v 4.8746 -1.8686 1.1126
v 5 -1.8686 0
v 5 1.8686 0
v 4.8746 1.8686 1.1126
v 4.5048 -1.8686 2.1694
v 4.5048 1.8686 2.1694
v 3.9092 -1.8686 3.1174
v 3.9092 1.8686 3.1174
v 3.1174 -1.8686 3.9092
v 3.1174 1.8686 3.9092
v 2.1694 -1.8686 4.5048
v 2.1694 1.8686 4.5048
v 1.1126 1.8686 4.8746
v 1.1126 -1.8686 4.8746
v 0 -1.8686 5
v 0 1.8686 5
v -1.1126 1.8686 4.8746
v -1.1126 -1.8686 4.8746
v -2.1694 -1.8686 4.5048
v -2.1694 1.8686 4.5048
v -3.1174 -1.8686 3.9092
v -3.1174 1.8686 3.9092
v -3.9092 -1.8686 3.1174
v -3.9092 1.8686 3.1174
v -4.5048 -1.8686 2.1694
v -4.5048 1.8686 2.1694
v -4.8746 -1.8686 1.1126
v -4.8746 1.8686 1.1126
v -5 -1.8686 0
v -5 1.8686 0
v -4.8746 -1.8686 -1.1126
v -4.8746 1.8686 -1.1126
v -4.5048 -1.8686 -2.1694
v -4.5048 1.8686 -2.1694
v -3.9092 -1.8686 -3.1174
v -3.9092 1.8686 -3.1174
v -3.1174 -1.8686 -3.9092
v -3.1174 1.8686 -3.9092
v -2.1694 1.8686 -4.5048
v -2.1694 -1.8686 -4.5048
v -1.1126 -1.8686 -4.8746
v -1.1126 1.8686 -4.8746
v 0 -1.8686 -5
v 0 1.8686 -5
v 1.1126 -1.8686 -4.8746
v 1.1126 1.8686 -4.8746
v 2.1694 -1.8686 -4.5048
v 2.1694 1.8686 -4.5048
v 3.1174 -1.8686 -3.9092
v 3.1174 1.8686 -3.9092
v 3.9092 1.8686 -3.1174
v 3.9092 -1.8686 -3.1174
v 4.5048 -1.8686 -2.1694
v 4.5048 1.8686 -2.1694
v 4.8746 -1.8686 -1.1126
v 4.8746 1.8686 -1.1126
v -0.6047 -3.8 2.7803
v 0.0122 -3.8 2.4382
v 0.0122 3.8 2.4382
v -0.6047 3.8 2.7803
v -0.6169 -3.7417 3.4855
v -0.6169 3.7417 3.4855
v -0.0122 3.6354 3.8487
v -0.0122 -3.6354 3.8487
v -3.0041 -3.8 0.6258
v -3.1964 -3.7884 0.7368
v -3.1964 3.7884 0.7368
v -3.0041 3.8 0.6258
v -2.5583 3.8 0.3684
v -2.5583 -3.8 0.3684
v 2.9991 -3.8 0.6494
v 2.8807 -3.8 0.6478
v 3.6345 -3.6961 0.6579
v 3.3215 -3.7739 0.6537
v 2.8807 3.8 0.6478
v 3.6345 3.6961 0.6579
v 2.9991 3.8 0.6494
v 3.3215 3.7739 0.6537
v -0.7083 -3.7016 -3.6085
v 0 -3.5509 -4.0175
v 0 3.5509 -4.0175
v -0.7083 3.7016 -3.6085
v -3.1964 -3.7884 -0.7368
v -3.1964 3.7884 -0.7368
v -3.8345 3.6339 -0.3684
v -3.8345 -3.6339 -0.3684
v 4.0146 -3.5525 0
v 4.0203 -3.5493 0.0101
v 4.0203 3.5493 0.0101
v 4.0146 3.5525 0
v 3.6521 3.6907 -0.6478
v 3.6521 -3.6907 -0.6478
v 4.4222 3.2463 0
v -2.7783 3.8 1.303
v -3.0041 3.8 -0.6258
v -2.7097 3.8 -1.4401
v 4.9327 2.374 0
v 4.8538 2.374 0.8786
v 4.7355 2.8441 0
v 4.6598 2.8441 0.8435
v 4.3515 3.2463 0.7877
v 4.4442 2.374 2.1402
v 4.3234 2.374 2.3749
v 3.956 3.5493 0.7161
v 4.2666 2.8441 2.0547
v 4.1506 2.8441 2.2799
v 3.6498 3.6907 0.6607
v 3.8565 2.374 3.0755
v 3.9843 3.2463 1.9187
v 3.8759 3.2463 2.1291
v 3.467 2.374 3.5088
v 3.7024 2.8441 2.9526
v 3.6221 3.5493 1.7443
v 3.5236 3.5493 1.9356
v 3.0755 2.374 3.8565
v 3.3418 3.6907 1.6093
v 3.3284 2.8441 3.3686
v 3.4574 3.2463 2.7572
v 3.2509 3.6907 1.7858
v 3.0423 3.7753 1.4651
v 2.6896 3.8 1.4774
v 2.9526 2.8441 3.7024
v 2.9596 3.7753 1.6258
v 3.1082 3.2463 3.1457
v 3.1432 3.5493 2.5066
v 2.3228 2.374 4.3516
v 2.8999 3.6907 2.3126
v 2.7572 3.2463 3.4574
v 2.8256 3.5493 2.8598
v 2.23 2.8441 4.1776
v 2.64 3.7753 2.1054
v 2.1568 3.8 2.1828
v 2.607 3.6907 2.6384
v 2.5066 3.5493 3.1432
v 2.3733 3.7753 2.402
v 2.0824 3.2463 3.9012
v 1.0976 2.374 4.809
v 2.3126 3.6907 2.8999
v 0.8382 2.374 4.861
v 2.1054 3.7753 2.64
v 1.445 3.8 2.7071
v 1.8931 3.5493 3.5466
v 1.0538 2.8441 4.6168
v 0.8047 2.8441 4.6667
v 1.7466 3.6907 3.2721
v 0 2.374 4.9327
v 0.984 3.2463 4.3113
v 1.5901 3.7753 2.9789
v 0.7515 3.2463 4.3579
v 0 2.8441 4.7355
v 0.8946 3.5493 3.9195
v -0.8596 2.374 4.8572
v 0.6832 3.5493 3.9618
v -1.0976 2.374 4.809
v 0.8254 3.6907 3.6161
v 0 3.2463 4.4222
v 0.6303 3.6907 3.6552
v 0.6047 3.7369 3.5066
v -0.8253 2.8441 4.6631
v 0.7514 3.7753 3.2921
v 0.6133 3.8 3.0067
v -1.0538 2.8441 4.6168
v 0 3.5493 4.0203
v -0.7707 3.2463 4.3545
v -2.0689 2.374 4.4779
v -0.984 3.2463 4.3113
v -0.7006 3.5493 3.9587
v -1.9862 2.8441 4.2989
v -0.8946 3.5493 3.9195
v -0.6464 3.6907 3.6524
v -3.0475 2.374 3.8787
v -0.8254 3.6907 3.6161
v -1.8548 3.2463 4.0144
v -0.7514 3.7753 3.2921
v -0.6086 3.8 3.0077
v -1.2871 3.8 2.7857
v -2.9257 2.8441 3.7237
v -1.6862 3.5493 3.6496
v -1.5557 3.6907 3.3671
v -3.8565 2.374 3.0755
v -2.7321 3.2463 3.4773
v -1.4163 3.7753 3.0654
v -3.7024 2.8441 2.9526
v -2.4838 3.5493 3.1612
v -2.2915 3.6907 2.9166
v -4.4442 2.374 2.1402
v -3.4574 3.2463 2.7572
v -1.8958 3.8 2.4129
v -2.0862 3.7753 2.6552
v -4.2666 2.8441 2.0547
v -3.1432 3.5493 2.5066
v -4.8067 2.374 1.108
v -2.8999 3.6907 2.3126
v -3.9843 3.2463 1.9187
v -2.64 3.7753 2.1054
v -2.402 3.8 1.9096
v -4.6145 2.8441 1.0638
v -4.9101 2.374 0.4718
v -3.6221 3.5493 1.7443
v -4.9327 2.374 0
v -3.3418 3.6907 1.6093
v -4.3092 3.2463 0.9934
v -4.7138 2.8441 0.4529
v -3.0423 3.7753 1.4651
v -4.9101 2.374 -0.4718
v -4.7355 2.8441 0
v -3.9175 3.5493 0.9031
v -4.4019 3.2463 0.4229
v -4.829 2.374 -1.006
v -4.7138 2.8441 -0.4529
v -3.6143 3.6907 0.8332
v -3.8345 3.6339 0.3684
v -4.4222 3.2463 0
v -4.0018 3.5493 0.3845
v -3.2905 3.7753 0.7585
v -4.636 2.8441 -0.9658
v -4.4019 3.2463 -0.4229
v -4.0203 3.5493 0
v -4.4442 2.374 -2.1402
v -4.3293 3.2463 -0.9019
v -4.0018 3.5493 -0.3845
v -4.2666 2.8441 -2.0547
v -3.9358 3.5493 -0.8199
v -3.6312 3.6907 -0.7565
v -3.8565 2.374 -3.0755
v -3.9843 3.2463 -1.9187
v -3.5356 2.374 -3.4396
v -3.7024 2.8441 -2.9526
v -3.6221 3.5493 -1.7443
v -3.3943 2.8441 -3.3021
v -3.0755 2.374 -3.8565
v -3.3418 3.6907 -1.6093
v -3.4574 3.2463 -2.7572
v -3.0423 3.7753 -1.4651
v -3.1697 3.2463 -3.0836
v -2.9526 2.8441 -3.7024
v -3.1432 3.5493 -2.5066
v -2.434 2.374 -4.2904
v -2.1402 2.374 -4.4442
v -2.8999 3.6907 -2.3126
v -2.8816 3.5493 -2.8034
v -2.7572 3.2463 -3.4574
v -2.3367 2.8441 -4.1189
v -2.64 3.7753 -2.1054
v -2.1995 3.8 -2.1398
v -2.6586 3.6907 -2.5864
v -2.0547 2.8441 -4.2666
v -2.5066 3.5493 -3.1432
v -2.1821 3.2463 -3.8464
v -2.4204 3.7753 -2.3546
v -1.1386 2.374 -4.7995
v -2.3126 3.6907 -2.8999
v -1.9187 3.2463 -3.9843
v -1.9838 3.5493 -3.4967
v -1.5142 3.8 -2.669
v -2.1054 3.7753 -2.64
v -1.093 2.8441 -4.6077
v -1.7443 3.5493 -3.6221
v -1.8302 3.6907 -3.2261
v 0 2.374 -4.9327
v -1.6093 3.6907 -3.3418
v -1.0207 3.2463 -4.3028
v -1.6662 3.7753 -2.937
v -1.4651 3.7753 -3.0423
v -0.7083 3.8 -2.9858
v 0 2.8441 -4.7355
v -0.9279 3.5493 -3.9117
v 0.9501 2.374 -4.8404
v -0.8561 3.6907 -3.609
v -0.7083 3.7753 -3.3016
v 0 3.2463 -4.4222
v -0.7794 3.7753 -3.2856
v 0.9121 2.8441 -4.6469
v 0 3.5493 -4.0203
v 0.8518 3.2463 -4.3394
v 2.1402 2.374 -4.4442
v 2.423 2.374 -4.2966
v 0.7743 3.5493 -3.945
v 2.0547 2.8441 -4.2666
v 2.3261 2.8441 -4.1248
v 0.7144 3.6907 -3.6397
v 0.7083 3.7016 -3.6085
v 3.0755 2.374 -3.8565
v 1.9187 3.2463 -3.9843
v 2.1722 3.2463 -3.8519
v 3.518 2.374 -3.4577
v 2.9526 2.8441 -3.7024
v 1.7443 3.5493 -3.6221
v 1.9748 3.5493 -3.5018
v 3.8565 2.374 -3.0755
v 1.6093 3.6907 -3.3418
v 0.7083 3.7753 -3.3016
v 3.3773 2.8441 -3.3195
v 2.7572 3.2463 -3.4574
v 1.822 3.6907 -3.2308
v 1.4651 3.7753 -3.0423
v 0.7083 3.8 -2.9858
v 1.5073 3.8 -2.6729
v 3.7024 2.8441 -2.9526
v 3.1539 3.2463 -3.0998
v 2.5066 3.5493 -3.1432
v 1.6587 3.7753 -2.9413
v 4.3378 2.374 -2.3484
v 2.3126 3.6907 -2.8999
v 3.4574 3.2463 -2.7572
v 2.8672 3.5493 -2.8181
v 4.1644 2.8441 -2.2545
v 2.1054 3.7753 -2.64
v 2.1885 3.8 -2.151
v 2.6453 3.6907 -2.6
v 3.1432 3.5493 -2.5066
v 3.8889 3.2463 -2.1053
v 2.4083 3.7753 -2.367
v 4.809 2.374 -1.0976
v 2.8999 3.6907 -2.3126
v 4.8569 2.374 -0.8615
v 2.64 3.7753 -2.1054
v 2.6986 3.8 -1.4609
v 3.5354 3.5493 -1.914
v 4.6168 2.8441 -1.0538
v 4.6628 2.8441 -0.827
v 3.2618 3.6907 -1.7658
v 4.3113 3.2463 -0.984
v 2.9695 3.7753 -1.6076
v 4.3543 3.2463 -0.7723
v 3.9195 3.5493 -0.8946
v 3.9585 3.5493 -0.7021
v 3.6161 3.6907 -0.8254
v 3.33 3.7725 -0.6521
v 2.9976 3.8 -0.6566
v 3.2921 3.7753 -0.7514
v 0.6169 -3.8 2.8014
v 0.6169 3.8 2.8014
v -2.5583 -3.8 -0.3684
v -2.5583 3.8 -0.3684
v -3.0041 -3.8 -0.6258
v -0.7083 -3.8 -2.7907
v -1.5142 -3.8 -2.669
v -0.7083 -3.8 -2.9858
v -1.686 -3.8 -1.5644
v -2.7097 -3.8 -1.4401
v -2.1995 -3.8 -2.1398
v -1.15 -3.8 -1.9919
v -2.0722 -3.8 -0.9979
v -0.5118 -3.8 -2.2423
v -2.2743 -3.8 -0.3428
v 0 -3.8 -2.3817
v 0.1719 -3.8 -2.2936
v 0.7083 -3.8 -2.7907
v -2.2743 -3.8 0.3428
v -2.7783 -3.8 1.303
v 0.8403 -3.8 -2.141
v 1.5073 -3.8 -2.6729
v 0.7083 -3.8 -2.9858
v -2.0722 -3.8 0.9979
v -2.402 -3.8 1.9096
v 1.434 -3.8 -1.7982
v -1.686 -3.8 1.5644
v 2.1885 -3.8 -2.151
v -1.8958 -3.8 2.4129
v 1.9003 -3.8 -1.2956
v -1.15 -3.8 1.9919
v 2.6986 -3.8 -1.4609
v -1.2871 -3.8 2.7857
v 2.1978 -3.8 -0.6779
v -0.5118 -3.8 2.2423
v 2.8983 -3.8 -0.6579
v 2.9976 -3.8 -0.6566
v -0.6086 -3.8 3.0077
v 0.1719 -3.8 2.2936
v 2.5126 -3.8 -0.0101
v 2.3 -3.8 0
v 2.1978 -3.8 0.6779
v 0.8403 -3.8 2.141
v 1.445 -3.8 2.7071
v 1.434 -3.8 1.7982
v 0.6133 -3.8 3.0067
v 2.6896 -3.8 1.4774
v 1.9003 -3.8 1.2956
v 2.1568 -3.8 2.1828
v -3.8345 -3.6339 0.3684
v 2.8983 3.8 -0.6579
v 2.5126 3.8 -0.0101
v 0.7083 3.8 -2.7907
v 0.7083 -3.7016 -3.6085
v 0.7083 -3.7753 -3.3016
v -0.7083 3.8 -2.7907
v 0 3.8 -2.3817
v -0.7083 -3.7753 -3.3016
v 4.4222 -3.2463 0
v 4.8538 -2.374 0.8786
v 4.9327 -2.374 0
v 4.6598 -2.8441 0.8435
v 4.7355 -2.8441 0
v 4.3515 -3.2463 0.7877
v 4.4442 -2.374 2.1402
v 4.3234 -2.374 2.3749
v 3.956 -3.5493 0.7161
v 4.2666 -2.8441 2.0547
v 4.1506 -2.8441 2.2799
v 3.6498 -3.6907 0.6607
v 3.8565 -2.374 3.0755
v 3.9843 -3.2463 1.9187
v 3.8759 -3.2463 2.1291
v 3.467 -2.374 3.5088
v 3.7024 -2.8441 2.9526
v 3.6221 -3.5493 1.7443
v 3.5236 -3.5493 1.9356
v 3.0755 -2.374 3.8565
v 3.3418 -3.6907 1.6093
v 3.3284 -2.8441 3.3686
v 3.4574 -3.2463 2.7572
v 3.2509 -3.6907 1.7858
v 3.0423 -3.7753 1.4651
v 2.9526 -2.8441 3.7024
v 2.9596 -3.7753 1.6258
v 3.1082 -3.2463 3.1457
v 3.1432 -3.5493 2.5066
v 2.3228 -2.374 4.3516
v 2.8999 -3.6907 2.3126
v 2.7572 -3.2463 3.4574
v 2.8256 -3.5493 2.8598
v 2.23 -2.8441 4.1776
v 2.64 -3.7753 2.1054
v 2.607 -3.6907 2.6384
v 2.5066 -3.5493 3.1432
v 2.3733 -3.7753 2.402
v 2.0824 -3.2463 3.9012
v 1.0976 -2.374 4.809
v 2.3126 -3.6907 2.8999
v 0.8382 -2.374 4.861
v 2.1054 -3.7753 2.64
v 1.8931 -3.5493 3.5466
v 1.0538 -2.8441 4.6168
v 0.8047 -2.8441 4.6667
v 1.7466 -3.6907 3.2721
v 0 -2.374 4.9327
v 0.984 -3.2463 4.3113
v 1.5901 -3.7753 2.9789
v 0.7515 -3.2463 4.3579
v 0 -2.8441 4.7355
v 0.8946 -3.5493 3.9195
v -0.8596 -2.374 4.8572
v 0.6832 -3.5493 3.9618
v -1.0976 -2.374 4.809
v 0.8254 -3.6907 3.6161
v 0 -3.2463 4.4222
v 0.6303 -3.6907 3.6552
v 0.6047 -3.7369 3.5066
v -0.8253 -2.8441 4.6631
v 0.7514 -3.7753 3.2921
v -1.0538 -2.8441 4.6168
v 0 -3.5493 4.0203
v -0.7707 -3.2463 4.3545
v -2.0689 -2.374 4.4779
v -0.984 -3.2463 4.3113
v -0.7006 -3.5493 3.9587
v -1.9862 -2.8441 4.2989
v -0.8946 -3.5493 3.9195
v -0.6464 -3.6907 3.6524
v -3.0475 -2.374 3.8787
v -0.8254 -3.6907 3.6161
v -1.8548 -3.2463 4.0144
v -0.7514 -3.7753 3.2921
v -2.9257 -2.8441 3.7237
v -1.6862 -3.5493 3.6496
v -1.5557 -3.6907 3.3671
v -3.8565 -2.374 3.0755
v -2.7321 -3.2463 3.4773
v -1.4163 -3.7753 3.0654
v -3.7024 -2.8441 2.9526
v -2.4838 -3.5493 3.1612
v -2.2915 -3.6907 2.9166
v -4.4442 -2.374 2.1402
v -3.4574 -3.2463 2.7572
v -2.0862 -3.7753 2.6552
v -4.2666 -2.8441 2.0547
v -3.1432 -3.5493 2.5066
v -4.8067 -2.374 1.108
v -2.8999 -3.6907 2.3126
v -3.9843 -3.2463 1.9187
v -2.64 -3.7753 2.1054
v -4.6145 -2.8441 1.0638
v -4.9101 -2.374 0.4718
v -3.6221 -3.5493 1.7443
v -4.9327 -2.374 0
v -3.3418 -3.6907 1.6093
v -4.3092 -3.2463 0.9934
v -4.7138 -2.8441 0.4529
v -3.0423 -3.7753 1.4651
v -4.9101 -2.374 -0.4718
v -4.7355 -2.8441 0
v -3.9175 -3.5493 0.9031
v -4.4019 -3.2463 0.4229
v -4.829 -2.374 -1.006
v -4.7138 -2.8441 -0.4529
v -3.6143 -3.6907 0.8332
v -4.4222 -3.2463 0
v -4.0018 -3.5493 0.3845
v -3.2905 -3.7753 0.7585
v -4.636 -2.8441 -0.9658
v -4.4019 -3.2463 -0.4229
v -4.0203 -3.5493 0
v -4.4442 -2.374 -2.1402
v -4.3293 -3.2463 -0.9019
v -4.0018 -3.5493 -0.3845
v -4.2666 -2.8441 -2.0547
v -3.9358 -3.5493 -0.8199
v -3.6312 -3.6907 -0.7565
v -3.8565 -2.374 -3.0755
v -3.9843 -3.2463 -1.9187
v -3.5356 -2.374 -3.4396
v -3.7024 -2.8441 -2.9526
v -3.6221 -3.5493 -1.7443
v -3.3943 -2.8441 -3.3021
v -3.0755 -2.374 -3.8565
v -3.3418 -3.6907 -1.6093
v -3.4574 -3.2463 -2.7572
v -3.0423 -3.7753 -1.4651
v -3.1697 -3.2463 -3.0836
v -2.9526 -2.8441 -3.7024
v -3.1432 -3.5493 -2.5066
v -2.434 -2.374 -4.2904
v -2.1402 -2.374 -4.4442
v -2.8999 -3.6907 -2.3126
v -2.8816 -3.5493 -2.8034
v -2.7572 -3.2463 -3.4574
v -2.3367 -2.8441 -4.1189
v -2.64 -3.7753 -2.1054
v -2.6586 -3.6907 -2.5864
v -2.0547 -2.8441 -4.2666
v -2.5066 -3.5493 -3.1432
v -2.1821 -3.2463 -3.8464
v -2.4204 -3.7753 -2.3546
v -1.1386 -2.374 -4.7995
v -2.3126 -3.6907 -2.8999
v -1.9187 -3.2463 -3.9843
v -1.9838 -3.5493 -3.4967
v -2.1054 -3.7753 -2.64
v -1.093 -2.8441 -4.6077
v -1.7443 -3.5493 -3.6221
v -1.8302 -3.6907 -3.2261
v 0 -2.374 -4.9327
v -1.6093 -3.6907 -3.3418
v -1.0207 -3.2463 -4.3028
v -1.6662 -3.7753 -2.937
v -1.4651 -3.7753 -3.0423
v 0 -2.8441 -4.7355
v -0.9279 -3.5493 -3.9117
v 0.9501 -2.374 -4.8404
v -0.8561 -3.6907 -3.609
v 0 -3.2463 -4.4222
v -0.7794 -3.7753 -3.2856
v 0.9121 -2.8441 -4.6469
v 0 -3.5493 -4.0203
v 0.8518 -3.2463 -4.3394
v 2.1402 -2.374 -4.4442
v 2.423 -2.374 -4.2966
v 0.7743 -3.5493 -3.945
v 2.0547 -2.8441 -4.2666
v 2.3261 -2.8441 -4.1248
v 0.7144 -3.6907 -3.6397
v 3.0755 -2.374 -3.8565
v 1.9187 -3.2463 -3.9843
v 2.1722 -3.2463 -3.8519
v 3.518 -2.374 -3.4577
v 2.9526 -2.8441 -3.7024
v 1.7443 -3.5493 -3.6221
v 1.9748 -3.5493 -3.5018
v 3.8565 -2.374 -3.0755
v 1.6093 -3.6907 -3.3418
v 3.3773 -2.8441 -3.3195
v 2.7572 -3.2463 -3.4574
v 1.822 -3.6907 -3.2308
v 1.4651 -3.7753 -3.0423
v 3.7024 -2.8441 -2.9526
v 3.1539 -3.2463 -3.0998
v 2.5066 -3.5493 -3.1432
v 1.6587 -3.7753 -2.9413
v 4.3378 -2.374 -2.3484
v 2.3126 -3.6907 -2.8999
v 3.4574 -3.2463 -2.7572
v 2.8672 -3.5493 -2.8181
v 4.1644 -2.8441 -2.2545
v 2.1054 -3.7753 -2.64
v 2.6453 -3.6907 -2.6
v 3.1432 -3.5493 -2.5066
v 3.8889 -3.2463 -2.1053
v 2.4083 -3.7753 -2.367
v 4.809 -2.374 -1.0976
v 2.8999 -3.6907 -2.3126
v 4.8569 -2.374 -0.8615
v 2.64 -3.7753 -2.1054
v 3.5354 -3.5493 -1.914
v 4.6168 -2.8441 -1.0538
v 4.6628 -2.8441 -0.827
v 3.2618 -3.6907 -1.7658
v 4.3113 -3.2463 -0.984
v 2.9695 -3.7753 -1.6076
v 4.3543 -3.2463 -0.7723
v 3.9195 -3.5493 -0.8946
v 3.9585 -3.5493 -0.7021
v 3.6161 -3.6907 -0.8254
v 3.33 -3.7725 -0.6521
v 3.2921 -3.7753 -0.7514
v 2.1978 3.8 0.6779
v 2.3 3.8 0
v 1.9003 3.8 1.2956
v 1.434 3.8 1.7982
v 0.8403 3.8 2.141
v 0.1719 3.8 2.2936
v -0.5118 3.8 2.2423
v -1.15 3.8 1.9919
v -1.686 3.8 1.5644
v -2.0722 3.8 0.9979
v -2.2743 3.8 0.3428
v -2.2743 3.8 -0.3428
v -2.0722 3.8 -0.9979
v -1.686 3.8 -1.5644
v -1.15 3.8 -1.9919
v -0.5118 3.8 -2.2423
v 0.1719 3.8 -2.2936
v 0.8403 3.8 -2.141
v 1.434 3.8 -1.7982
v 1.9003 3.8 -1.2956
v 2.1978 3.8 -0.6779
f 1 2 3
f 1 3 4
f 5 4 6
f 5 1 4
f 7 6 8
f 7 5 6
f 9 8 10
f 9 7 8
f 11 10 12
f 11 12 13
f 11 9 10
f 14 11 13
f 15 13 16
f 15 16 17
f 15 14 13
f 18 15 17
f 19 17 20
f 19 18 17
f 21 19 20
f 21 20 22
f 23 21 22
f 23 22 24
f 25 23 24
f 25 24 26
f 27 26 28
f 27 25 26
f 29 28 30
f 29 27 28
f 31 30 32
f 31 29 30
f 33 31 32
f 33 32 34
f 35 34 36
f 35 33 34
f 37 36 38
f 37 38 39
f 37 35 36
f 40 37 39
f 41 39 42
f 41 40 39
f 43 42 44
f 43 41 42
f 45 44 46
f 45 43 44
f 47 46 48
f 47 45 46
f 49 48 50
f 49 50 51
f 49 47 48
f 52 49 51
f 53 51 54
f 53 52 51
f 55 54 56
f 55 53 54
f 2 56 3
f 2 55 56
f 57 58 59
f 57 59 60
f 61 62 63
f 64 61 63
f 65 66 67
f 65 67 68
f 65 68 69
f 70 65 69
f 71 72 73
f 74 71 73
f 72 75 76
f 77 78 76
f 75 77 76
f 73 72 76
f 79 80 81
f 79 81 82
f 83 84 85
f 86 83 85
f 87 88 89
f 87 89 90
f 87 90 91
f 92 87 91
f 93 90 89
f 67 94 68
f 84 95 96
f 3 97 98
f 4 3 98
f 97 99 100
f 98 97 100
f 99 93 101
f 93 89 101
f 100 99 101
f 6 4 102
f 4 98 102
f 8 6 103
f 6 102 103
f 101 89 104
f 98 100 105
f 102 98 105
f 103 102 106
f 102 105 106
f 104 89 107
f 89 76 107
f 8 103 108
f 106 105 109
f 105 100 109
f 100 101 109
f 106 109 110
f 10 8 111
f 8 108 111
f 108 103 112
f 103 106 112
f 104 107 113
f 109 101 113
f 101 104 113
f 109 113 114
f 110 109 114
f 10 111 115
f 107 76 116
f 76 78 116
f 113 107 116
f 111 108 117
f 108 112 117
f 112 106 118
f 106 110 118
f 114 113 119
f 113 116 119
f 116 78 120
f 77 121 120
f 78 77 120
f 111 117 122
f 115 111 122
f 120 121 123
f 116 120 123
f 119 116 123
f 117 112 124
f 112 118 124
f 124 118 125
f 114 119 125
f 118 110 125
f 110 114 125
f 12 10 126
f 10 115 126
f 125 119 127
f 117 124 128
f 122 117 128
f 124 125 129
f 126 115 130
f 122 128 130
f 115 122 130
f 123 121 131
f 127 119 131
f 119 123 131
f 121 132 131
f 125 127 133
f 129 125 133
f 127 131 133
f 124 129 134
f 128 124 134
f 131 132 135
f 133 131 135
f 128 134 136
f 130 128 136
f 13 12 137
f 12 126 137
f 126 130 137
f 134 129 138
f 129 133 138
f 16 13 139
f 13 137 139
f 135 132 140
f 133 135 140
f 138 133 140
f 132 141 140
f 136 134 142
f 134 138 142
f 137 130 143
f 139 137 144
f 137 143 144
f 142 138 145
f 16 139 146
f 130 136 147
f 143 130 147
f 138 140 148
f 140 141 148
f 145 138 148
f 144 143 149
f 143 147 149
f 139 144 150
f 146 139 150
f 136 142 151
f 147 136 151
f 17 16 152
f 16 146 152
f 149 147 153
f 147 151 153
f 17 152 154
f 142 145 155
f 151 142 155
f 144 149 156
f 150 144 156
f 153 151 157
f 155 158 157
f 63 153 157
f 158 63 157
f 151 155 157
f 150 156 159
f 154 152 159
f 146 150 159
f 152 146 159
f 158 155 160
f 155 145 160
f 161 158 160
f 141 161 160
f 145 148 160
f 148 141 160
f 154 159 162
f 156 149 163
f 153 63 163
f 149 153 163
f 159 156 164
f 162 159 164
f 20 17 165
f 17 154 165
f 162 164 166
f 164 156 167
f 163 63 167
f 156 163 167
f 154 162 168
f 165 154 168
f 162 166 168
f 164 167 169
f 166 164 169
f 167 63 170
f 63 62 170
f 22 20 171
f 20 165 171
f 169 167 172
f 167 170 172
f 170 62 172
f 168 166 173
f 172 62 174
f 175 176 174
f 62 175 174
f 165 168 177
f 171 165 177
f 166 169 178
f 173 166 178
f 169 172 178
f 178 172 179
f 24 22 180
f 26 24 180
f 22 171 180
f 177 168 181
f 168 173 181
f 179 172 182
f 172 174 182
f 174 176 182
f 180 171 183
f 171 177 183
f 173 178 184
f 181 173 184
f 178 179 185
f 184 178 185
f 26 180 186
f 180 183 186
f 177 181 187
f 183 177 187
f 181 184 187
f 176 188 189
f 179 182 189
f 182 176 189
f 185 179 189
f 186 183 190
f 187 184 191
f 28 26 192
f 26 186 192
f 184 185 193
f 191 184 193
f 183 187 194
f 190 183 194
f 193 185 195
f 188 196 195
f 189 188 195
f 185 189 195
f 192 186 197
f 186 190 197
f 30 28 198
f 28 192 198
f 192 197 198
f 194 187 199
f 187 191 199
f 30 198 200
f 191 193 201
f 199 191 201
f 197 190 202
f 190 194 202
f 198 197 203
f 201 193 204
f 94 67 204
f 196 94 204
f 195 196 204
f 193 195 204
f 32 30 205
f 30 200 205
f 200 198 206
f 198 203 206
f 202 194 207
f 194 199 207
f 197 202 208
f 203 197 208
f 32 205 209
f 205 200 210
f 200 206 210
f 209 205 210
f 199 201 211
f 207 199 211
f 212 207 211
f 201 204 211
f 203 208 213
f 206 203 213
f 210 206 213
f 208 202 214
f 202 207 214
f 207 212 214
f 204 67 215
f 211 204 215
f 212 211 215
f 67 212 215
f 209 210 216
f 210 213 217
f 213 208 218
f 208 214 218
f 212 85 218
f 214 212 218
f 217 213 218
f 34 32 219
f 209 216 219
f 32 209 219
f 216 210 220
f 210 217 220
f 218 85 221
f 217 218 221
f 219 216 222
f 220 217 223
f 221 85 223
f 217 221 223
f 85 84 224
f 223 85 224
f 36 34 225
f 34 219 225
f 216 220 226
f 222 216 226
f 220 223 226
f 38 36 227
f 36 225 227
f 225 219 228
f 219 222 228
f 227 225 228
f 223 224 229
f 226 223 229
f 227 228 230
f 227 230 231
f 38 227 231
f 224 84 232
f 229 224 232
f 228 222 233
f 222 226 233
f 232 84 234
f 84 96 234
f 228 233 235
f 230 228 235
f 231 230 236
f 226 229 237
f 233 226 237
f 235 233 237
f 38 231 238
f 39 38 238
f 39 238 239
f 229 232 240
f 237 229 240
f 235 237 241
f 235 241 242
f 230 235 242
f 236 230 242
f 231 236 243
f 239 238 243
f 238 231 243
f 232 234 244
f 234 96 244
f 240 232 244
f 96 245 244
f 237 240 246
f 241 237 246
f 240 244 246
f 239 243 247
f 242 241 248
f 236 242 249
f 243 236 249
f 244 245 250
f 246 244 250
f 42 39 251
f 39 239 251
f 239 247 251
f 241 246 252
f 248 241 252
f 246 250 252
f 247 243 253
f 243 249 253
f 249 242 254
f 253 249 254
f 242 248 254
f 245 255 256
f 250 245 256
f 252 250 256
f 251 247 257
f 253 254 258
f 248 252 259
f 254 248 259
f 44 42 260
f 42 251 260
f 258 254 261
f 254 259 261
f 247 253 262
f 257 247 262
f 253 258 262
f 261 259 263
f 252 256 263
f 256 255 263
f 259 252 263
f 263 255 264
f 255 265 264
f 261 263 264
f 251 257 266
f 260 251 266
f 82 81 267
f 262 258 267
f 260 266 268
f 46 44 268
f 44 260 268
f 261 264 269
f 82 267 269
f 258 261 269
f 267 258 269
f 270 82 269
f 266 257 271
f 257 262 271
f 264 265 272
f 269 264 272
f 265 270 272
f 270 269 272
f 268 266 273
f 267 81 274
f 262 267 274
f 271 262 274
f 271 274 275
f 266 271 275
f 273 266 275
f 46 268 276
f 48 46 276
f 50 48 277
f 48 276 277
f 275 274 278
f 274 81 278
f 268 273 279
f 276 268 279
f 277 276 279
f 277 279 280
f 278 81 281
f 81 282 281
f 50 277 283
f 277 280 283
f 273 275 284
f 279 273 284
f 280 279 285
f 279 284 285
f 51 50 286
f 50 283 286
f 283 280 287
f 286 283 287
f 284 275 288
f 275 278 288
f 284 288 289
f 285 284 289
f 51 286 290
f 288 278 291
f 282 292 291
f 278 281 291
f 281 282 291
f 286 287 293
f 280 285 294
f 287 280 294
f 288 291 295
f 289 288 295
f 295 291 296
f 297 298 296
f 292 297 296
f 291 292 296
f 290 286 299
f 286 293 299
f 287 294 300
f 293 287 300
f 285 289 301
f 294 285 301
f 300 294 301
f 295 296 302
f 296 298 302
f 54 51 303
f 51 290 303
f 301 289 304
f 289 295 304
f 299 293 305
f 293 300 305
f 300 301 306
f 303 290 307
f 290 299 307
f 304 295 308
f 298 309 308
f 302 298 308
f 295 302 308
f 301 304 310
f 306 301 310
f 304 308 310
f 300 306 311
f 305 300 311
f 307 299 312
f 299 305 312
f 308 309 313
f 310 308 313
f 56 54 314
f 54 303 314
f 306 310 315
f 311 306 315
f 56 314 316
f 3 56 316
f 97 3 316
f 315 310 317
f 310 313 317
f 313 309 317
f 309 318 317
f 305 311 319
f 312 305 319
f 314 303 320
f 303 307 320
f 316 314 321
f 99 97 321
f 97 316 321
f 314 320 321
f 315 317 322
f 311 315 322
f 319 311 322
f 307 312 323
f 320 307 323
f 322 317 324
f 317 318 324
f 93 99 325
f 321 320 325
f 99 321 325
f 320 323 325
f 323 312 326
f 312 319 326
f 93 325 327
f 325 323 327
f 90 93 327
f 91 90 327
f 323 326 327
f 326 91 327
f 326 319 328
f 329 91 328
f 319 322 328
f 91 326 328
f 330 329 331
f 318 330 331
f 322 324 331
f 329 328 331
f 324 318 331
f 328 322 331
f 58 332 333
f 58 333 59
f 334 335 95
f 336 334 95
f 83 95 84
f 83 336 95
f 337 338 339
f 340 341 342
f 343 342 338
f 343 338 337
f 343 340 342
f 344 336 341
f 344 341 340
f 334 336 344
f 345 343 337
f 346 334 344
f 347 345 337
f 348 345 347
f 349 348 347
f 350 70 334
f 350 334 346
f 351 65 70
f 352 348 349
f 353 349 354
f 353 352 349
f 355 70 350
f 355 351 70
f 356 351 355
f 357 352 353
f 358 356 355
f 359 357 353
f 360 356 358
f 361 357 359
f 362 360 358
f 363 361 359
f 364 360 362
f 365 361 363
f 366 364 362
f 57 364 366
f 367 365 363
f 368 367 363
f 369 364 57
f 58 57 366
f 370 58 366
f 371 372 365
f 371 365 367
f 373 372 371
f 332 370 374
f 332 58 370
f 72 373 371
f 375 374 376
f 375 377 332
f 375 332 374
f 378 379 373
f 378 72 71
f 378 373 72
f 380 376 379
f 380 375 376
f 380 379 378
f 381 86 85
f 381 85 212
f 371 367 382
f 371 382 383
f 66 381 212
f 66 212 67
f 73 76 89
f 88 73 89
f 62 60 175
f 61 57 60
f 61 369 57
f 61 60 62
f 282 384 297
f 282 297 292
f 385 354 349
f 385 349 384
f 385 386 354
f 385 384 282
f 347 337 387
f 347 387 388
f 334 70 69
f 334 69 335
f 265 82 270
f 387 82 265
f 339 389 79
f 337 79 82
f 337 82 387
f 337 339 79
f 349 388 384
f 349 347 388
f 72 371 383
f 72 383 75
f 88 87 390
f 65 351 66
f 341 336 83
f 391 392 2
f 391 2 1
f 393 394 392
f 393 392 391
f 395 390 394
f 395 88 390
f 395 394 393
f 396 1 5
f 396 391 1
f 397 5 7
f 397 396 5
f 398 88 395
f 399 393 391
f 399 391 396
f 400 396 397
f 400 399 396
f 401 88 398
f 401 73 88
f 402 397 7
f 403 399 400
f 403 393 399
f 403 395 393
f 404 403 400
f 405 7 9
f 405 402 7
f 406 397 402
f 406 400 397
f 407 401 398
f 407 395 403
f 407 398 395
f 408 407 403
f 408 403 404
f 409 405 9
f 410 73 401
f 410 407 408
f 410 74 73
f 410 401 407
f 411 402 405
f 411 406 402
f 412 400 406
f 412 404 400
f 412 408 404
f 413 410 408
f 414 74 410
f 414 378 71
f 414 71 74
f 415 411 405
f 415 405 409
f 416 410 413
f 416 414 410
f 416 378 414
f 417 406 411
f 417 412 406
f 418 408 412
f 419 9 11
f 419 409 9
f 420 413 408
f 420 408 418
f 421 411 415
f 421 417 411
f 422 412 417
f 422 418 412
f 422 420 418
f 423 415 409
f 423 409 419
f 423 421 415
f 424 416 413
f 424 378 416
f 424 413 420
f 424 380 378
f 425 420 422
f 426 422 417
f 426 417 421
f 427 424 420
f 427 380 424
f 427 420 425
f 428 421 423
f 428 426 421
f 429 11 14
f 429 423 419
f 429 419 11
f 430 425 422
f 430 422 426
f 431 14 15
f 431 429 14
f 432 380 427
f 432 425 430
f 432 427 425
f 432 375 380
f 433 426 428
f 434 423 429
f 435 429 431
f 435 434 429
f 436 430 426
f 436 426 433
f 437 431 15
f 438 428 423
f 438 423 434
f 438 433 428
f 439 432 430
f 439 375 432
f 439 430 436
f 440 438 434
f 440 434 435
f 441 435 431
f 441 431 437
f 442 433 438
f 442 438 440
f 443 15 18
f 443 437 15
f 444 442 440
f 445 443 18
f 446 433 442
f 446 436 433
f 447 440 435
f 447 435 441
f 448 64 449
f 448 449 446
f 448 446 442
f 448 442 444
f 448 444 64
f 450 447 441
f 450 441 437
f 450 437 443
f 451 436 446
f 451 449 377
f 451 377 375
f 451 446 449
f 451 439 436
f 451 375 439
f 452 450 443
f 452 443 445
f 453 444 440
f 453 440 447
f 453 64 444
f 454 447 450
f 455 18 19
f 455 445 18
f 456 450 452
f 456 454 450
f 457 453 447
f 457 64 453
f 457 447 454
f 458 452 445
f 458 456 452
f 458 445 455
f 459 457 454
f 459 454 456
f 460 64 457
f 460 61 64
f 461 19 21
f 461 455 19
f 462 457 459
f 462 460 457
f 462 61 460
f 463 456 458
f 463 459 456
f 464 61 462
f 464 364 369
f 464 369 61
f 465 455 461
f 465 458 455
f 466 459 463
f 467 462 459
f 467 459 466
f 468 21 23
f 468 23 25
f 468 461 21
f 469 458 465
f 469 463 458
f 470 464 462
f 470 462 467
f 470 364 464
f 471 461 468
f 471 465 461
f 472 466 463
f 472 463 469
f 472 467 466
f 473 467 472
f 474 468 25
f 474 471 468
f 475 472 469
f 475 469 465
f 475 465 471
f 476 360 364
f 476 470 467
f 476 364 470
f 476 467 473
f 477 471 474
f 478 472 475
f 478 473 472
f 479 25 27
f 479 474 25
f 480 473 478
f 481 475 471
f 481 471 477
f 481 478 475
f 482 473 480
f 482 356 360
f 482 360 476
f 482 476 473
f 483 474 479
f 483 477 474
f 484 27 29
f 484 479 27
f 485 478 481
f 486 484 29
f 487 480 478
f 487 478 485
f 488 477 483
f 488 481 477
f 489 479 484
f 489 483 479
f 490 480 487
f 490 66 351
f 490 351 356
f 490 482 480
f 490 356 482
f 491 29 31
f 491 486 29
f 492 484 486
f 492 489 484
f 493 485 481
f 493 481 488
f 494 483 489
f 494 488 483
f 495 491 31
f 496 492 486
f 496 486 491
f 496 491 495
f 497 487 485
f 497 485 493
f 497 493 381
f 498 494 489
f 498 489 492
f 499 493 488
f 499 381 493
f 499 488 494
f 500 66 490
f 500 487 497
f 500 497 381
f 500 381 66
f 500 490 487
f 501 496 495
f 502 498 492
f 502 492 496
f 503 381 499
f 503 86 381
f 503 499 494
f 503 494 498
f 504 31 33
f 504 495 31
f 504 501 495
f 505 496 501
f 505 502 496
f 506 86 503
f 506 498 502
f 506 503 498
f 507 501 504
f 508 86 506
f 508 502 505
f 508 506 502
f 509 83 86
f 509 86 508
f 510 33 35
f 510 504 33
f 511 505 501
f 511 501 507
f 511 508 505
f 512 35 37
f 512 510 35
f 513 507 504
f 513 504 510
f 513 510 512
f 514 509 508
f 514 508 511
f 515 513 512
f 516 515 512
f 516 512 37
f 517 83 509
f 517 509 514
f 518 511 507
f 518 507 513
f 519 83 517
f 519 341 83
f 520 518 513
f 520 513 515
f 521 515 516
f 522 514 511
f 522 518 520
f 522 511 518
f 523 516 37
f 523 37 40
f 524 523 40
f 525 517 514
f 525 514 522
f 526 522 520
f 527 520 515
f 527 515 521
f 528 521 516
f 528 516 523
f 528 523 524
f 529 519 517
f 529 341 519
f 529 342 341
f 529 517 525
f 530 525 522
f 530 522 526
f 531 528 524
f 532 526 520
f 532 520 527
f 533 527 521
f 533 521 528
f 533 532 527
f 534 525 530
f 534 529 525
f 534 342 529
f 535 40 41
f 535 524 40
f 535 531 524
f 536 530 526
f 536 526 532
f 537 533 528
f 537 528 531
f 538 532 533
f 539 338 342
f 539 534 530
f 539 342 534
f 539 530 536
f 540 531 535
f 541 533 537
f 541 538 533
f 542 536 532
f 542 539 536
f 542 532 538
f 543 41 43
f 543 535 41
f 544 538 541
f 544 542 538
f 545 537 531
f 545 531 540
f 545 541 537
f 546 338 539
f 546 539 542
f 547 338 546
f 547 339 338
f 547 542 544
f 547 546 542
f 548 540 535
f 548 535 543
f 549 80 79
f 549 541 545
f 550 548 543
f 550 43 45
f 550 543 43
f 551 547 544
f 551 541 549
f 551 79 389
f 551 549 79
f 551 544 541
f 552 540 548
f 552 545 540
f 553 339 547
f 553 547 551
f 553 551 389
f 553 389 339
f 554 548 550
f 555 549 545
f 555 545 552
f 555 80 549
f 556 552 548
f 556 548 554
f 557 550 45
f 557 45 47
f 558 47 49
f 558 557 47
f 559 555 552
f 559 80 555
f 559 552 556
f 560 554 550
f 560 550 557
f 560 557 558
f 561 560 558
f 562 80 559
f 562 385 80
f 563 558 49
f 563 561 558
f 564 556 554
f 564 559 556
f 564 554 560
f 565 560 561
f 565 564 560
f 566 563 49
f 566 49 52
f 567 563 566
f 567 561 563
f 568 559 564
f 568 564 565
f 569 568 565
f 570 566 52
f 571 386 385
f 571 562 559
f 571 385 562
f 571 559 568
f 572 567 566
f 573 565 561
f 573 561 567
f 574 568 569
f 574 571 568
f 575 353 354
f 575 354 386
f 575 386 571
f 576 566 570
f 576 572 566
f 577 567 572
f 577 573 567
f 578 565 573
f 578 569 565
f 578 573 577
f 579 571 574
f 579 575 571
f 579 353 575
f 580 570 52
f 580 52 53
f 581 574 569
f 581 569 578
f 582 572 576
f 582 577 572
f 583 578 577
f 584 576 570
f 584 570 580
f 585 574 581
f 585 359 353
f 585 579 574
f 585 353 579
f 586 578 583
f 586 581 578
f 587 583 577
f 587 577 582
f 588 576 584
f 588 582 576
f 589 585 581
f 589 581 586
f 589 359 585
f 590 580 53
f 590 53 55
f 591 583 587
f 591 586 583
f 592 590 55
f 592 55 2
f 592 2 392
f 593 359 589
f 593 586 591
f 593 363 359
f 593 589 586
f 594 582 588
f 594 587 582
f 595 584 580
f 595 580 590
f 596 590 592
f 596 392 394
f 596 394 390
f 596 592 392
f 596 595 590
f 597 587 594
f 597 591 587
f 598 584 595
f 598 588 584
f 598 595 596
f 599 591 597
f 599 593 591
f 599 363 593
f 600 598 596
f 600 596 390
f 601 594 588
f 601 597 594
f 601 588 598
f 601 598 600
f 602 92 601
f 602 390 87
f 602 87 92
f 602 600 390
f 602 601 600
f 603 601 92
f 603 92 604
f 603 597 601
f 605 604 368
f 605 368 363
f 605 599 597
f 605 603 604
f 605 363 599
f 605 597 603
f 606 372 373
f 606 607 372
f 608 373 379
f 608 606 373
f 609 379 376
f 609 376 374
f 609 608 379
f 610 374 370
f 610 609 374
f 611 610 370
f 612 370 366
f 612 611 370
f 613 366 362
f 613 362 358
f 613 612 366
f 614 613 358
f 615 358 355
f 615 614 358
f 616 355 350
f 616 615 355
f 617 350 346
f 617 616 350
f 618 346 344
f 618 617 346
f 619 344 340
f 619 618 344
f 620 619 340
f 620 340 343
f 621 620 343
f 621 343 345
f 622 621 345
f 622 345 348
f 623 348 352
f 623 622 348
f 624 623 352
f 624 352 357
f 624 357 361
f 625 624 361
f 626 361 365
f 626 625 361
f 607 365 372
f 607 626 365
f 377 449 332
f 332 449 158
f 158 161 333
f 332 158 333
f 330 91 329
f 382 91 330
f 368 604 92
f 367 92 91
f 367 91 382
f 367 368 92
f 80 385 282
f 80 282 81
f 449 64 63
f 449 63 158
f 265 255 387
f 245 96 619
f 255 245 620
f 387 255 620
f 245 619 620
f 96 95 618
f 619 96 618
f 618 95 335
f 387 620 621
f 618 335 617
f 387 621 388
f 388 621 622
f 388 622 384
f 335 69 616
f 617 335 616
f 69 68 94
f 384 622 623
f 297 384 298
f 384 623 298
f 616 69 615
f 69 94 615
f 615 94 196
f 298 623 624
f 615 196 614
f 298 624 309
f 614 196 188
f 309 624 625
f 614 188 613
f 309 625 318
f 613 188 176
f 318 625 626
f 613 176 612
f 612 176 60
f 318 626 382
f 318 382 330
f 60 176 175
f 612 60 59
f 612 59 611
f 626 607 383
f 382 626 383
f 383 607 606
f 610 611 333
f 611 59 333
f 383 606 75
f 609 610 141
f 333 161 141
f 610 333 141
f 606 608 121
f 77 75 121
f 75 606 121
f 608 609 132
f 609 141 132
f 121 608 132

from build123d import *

# Parameters (mm, degrees)
F0_R     = 5
F0_R_2   = 2.3
F1_DEPTH = 3.8


# Not quite as in the source:
# - a fillet or chamfer that OpenCascade refuses, or shapes differently, is made with other operations: its cross-section is extruded or revolved along the edge and cut away or added


with BuildPart() as f1:
    # F0 (on Front) → F1 (new body, symmetric)
    with BuildSketch(Plane.XZ):
        Circle(F0_R)
        Polygon((0, -4.0174636819), (-0.7082950324, -3.6085293543), (-0.7082950324, -2.7906606991), (0, -2.3817263714), (0.7082950324, -2.7906606991), (0.7082950324, -3.6085293543), align=None, mode=Mode.SUBTRACT)
        Polygon((-3.1964122335, 0.7368465077), (-2.5582844391, 0.3684232539), (-2.5582844391, -0.3684232539), (-3.1964122335, -0.7368465077), (-3.8345400279, -0.3684232539), (-3.8345400279, 0.3684232539), align=None, mode=Mode.SUBTRACT)
        Circle(F0_R_2, mode=Mode.SUBTRACT)
        Polygon((2.8982667587, -0.6579181574), (2.512562897, -0.0101405277), (2.8807028495, 0.6477776297), (3.6345466637, 0.6579181574), (4.0202505254, 0.0101405277), (3.6521105729, -0.6477776297), align=None, mode=Mode.SUBTRACT)
        Polygon((0.6046901305, 3.5066245139), (0.6168706685, 2.8013560578), (0.012180538, 2.4381731744), (-0.6046901305, 2.7802587472), (-0.6168706685, 3.4855272032), (-0.012180538, 3.8487100866), align=None, mode=Mode.SUBTRACT)
    extrude(amount=F1_DEPTH, both=True)

    # F2: fillet of radius 1.9313708499 on 3 edges, made by hand

    # F2_s1 → F2_t2 (revolve, cut)
    with BuildSketch(Plane.XY):
        with BuildLine():
            ThreePointArc((5, 1.8686291501), (4.4343145751, 3.2343145751), (3.0686291501, 3.8))
            Line((3.0686291501, 3.8), (5, 3.8))
            Line((5, 3.8), (5, 1.8686291501))
        make_face()
    revolve(axis=Axis((0, 3.8, 0), (0, -1, 0)), mode=Mode.SUBTRACT)

    # F2_s3 → F2_t4 (revolve, cut)
    with BuildSketch(Plane.XY):
        with BuildLine():
            ThreePointArc((5, -1.8686291501), (4.4343145751, -3.2343145751), (3.0686291501, -3.8))
            Line((3.0686291501, -3.8), (5, -3.8))
            Line((5, -3.8), (5, -1.8686291501))
        make_face()
    revolve(axis=Axis((0, -3.8, 0), (0, -1, 0)), mode=Mode.SUBTRACT)


solid = f1.part
